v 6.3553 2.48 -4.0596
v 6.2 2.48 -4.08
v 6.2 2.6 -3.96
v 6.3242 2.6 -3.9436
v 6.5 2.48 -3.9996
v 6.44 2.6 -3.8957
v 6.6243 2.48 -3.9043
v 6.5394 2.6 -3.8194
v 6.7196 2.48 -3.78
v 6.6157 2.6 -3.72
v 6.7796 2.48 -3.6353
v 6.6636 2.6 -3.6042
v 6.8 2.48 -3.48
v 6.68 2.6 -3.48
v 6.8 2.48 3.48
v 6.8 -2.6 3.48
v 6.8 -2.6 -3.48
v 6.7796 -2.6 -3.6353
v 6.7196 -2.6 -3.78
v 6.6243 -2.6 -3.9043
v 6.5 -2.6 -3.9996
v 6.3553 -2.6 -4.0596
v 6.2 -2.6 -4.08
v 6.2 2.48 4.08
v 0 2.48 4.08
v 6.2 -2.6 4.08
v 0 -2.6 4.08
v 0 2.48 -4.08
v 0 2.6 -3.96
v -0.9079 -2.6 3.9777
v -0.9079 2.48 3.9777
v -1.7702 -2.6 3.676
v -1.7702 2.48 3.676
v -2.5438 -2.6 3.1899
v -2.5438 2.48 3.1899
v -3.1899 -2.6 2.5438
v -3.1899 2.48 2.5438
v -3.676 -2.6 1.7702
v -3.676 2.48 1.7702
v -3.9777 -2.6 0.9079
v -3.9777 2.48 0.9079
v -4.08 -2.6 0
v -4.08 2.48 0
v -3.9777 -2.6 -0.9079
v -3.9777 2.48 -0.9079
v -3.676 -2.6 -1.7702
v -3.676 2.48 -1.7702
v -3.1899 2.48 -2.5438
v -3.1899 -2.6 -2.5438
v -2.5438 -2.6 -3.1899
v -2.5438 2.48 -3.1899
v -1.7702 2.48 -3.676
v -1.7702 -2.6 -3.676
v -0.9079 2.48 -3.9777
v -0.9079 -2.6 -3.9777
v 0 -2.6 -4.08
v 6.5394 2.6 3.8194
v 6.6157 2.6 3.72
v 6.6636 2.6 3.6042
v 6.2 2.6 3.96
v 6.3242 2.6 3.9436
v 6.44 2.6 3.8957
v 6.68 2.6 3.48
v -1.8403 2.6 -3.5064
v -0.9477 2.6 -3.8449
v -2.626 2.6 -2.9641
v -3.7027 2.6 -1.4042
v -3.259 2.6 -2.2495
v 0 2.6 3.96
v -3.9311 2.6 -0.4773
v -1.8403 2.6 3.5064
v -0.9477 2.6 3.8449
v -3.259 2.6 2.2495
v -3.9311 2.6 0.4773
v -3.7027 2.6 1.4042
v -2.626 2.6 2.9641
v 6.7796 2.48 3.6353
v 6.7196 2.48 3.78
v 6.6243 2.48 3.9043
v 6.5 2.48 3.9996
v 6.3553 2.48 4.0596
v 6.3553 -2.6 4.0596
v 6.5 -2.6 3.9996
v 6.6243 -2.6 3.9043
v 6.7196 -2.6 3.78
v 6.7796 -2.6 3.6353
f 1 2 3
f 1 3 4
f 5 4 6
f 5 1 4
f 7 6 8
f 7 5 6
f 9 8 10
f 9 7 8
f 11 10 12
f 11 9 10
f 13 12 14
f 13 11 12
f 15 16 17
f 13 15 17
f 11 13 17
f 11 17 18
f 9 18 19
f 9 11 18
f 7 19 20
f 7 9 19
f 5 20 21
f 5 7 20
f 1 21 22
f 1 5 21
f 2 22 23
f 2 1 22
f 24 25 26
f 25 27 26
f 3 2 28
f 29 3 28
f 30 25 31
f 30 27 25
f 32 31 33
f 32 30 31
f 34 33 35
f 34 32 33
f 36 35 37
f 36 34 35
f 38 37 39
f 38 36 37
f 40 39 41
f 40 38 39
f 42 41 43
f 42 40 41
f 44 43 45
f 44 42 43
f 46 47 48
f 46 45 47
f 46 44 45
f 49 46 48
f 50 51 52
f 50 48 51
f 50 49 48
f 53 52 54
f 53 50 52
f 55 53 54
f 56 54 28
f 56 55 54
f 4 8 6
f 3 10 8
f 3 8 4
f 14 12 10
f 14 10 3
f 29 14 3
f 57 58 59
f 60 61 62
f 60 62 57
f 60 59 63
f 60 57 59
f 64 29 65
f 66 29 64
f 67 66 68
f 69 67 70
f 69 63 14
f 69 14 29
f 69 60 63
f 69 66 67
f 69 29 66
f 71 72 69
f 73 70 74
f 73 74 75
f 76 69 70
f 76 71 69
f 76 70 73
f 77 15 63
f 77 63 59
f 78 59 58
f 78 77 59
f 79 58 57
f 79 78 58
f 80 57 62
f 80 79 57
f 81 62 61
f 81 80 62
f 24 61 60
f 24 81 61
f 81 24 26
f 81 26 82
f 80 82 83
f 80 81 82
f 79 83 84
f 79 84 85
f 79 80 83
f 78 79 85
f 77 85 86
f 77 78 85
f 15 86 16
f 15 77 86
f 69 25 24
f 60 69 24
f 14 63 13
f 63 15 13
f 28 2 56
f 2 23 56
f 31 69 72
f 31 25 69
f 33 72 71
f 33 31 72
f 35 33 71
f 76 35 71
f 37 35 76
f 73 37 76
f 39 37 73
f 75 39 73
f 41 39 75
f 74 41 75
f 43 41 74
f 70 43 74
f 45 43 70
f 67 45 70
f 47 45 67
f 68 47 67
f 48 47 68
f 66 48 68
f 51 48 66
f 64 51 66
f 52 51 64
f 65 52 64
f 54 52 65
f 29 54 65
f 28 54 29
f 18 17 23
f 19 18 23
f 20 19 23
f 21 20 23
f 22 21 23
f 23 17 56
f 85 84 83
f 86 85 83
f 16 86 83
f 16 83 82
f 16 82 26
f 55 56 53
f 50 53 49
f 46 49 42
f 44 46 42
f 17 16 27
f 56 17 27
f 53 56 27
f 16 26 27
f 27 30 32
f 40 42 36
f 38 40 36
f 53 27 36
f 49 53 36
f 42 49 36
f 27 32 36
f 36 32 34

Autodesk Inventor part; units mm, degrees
ref_plane "YZ Plane" through (0, 0, 0) normal (1, 0, 0) x (0, 1, 0)
ref_plane "XZ Plane" through (0, 0, 0) normal (0, 1, 0) x (-1, 0, 0)
ref_plane "XY Plane" through (0, 0, 0) normal (0, 0, 1) x (1, 0, 0)
sketch "Sketch2" plane through (0, 0, 0) normal (0, 1, 0) x (-1, 0, 0)
  line L0 (-6.8, 4.08) -> (-6.8, -4.08)
  line L1 (-6.8, -4.08) -> (0, -4.08)
  arc A0 (0, -4.08) -> (0, 4.08) centre (0, 0) ccw
  line L2 (0, 4.08) -> (-6.8, 4.08)
  dimension "d0" = 8.16
  dimension "d1" = 6.8
extrude "Extrusion1" add sketch "Sketch2" along normal mid plane 5.2
fillet "Fillet1" radius 0.6 2 edges at (6.8, 0, 4.08) (6.8, 0, -4.08)
chamfer "Chamfer1" distance 0.12 angle 45 6 edges at (-4.08, 2.6, 0) (3.1, 2.6, 4.08) (6.6243, 2.6, 3.9043) (6.8, 2.6, 0) (6.6243, 2.6, -3.9043) (3.1, 2.6, -4.08)
properties part number "99145-LtBluishGray" material "ABS Plastic"
